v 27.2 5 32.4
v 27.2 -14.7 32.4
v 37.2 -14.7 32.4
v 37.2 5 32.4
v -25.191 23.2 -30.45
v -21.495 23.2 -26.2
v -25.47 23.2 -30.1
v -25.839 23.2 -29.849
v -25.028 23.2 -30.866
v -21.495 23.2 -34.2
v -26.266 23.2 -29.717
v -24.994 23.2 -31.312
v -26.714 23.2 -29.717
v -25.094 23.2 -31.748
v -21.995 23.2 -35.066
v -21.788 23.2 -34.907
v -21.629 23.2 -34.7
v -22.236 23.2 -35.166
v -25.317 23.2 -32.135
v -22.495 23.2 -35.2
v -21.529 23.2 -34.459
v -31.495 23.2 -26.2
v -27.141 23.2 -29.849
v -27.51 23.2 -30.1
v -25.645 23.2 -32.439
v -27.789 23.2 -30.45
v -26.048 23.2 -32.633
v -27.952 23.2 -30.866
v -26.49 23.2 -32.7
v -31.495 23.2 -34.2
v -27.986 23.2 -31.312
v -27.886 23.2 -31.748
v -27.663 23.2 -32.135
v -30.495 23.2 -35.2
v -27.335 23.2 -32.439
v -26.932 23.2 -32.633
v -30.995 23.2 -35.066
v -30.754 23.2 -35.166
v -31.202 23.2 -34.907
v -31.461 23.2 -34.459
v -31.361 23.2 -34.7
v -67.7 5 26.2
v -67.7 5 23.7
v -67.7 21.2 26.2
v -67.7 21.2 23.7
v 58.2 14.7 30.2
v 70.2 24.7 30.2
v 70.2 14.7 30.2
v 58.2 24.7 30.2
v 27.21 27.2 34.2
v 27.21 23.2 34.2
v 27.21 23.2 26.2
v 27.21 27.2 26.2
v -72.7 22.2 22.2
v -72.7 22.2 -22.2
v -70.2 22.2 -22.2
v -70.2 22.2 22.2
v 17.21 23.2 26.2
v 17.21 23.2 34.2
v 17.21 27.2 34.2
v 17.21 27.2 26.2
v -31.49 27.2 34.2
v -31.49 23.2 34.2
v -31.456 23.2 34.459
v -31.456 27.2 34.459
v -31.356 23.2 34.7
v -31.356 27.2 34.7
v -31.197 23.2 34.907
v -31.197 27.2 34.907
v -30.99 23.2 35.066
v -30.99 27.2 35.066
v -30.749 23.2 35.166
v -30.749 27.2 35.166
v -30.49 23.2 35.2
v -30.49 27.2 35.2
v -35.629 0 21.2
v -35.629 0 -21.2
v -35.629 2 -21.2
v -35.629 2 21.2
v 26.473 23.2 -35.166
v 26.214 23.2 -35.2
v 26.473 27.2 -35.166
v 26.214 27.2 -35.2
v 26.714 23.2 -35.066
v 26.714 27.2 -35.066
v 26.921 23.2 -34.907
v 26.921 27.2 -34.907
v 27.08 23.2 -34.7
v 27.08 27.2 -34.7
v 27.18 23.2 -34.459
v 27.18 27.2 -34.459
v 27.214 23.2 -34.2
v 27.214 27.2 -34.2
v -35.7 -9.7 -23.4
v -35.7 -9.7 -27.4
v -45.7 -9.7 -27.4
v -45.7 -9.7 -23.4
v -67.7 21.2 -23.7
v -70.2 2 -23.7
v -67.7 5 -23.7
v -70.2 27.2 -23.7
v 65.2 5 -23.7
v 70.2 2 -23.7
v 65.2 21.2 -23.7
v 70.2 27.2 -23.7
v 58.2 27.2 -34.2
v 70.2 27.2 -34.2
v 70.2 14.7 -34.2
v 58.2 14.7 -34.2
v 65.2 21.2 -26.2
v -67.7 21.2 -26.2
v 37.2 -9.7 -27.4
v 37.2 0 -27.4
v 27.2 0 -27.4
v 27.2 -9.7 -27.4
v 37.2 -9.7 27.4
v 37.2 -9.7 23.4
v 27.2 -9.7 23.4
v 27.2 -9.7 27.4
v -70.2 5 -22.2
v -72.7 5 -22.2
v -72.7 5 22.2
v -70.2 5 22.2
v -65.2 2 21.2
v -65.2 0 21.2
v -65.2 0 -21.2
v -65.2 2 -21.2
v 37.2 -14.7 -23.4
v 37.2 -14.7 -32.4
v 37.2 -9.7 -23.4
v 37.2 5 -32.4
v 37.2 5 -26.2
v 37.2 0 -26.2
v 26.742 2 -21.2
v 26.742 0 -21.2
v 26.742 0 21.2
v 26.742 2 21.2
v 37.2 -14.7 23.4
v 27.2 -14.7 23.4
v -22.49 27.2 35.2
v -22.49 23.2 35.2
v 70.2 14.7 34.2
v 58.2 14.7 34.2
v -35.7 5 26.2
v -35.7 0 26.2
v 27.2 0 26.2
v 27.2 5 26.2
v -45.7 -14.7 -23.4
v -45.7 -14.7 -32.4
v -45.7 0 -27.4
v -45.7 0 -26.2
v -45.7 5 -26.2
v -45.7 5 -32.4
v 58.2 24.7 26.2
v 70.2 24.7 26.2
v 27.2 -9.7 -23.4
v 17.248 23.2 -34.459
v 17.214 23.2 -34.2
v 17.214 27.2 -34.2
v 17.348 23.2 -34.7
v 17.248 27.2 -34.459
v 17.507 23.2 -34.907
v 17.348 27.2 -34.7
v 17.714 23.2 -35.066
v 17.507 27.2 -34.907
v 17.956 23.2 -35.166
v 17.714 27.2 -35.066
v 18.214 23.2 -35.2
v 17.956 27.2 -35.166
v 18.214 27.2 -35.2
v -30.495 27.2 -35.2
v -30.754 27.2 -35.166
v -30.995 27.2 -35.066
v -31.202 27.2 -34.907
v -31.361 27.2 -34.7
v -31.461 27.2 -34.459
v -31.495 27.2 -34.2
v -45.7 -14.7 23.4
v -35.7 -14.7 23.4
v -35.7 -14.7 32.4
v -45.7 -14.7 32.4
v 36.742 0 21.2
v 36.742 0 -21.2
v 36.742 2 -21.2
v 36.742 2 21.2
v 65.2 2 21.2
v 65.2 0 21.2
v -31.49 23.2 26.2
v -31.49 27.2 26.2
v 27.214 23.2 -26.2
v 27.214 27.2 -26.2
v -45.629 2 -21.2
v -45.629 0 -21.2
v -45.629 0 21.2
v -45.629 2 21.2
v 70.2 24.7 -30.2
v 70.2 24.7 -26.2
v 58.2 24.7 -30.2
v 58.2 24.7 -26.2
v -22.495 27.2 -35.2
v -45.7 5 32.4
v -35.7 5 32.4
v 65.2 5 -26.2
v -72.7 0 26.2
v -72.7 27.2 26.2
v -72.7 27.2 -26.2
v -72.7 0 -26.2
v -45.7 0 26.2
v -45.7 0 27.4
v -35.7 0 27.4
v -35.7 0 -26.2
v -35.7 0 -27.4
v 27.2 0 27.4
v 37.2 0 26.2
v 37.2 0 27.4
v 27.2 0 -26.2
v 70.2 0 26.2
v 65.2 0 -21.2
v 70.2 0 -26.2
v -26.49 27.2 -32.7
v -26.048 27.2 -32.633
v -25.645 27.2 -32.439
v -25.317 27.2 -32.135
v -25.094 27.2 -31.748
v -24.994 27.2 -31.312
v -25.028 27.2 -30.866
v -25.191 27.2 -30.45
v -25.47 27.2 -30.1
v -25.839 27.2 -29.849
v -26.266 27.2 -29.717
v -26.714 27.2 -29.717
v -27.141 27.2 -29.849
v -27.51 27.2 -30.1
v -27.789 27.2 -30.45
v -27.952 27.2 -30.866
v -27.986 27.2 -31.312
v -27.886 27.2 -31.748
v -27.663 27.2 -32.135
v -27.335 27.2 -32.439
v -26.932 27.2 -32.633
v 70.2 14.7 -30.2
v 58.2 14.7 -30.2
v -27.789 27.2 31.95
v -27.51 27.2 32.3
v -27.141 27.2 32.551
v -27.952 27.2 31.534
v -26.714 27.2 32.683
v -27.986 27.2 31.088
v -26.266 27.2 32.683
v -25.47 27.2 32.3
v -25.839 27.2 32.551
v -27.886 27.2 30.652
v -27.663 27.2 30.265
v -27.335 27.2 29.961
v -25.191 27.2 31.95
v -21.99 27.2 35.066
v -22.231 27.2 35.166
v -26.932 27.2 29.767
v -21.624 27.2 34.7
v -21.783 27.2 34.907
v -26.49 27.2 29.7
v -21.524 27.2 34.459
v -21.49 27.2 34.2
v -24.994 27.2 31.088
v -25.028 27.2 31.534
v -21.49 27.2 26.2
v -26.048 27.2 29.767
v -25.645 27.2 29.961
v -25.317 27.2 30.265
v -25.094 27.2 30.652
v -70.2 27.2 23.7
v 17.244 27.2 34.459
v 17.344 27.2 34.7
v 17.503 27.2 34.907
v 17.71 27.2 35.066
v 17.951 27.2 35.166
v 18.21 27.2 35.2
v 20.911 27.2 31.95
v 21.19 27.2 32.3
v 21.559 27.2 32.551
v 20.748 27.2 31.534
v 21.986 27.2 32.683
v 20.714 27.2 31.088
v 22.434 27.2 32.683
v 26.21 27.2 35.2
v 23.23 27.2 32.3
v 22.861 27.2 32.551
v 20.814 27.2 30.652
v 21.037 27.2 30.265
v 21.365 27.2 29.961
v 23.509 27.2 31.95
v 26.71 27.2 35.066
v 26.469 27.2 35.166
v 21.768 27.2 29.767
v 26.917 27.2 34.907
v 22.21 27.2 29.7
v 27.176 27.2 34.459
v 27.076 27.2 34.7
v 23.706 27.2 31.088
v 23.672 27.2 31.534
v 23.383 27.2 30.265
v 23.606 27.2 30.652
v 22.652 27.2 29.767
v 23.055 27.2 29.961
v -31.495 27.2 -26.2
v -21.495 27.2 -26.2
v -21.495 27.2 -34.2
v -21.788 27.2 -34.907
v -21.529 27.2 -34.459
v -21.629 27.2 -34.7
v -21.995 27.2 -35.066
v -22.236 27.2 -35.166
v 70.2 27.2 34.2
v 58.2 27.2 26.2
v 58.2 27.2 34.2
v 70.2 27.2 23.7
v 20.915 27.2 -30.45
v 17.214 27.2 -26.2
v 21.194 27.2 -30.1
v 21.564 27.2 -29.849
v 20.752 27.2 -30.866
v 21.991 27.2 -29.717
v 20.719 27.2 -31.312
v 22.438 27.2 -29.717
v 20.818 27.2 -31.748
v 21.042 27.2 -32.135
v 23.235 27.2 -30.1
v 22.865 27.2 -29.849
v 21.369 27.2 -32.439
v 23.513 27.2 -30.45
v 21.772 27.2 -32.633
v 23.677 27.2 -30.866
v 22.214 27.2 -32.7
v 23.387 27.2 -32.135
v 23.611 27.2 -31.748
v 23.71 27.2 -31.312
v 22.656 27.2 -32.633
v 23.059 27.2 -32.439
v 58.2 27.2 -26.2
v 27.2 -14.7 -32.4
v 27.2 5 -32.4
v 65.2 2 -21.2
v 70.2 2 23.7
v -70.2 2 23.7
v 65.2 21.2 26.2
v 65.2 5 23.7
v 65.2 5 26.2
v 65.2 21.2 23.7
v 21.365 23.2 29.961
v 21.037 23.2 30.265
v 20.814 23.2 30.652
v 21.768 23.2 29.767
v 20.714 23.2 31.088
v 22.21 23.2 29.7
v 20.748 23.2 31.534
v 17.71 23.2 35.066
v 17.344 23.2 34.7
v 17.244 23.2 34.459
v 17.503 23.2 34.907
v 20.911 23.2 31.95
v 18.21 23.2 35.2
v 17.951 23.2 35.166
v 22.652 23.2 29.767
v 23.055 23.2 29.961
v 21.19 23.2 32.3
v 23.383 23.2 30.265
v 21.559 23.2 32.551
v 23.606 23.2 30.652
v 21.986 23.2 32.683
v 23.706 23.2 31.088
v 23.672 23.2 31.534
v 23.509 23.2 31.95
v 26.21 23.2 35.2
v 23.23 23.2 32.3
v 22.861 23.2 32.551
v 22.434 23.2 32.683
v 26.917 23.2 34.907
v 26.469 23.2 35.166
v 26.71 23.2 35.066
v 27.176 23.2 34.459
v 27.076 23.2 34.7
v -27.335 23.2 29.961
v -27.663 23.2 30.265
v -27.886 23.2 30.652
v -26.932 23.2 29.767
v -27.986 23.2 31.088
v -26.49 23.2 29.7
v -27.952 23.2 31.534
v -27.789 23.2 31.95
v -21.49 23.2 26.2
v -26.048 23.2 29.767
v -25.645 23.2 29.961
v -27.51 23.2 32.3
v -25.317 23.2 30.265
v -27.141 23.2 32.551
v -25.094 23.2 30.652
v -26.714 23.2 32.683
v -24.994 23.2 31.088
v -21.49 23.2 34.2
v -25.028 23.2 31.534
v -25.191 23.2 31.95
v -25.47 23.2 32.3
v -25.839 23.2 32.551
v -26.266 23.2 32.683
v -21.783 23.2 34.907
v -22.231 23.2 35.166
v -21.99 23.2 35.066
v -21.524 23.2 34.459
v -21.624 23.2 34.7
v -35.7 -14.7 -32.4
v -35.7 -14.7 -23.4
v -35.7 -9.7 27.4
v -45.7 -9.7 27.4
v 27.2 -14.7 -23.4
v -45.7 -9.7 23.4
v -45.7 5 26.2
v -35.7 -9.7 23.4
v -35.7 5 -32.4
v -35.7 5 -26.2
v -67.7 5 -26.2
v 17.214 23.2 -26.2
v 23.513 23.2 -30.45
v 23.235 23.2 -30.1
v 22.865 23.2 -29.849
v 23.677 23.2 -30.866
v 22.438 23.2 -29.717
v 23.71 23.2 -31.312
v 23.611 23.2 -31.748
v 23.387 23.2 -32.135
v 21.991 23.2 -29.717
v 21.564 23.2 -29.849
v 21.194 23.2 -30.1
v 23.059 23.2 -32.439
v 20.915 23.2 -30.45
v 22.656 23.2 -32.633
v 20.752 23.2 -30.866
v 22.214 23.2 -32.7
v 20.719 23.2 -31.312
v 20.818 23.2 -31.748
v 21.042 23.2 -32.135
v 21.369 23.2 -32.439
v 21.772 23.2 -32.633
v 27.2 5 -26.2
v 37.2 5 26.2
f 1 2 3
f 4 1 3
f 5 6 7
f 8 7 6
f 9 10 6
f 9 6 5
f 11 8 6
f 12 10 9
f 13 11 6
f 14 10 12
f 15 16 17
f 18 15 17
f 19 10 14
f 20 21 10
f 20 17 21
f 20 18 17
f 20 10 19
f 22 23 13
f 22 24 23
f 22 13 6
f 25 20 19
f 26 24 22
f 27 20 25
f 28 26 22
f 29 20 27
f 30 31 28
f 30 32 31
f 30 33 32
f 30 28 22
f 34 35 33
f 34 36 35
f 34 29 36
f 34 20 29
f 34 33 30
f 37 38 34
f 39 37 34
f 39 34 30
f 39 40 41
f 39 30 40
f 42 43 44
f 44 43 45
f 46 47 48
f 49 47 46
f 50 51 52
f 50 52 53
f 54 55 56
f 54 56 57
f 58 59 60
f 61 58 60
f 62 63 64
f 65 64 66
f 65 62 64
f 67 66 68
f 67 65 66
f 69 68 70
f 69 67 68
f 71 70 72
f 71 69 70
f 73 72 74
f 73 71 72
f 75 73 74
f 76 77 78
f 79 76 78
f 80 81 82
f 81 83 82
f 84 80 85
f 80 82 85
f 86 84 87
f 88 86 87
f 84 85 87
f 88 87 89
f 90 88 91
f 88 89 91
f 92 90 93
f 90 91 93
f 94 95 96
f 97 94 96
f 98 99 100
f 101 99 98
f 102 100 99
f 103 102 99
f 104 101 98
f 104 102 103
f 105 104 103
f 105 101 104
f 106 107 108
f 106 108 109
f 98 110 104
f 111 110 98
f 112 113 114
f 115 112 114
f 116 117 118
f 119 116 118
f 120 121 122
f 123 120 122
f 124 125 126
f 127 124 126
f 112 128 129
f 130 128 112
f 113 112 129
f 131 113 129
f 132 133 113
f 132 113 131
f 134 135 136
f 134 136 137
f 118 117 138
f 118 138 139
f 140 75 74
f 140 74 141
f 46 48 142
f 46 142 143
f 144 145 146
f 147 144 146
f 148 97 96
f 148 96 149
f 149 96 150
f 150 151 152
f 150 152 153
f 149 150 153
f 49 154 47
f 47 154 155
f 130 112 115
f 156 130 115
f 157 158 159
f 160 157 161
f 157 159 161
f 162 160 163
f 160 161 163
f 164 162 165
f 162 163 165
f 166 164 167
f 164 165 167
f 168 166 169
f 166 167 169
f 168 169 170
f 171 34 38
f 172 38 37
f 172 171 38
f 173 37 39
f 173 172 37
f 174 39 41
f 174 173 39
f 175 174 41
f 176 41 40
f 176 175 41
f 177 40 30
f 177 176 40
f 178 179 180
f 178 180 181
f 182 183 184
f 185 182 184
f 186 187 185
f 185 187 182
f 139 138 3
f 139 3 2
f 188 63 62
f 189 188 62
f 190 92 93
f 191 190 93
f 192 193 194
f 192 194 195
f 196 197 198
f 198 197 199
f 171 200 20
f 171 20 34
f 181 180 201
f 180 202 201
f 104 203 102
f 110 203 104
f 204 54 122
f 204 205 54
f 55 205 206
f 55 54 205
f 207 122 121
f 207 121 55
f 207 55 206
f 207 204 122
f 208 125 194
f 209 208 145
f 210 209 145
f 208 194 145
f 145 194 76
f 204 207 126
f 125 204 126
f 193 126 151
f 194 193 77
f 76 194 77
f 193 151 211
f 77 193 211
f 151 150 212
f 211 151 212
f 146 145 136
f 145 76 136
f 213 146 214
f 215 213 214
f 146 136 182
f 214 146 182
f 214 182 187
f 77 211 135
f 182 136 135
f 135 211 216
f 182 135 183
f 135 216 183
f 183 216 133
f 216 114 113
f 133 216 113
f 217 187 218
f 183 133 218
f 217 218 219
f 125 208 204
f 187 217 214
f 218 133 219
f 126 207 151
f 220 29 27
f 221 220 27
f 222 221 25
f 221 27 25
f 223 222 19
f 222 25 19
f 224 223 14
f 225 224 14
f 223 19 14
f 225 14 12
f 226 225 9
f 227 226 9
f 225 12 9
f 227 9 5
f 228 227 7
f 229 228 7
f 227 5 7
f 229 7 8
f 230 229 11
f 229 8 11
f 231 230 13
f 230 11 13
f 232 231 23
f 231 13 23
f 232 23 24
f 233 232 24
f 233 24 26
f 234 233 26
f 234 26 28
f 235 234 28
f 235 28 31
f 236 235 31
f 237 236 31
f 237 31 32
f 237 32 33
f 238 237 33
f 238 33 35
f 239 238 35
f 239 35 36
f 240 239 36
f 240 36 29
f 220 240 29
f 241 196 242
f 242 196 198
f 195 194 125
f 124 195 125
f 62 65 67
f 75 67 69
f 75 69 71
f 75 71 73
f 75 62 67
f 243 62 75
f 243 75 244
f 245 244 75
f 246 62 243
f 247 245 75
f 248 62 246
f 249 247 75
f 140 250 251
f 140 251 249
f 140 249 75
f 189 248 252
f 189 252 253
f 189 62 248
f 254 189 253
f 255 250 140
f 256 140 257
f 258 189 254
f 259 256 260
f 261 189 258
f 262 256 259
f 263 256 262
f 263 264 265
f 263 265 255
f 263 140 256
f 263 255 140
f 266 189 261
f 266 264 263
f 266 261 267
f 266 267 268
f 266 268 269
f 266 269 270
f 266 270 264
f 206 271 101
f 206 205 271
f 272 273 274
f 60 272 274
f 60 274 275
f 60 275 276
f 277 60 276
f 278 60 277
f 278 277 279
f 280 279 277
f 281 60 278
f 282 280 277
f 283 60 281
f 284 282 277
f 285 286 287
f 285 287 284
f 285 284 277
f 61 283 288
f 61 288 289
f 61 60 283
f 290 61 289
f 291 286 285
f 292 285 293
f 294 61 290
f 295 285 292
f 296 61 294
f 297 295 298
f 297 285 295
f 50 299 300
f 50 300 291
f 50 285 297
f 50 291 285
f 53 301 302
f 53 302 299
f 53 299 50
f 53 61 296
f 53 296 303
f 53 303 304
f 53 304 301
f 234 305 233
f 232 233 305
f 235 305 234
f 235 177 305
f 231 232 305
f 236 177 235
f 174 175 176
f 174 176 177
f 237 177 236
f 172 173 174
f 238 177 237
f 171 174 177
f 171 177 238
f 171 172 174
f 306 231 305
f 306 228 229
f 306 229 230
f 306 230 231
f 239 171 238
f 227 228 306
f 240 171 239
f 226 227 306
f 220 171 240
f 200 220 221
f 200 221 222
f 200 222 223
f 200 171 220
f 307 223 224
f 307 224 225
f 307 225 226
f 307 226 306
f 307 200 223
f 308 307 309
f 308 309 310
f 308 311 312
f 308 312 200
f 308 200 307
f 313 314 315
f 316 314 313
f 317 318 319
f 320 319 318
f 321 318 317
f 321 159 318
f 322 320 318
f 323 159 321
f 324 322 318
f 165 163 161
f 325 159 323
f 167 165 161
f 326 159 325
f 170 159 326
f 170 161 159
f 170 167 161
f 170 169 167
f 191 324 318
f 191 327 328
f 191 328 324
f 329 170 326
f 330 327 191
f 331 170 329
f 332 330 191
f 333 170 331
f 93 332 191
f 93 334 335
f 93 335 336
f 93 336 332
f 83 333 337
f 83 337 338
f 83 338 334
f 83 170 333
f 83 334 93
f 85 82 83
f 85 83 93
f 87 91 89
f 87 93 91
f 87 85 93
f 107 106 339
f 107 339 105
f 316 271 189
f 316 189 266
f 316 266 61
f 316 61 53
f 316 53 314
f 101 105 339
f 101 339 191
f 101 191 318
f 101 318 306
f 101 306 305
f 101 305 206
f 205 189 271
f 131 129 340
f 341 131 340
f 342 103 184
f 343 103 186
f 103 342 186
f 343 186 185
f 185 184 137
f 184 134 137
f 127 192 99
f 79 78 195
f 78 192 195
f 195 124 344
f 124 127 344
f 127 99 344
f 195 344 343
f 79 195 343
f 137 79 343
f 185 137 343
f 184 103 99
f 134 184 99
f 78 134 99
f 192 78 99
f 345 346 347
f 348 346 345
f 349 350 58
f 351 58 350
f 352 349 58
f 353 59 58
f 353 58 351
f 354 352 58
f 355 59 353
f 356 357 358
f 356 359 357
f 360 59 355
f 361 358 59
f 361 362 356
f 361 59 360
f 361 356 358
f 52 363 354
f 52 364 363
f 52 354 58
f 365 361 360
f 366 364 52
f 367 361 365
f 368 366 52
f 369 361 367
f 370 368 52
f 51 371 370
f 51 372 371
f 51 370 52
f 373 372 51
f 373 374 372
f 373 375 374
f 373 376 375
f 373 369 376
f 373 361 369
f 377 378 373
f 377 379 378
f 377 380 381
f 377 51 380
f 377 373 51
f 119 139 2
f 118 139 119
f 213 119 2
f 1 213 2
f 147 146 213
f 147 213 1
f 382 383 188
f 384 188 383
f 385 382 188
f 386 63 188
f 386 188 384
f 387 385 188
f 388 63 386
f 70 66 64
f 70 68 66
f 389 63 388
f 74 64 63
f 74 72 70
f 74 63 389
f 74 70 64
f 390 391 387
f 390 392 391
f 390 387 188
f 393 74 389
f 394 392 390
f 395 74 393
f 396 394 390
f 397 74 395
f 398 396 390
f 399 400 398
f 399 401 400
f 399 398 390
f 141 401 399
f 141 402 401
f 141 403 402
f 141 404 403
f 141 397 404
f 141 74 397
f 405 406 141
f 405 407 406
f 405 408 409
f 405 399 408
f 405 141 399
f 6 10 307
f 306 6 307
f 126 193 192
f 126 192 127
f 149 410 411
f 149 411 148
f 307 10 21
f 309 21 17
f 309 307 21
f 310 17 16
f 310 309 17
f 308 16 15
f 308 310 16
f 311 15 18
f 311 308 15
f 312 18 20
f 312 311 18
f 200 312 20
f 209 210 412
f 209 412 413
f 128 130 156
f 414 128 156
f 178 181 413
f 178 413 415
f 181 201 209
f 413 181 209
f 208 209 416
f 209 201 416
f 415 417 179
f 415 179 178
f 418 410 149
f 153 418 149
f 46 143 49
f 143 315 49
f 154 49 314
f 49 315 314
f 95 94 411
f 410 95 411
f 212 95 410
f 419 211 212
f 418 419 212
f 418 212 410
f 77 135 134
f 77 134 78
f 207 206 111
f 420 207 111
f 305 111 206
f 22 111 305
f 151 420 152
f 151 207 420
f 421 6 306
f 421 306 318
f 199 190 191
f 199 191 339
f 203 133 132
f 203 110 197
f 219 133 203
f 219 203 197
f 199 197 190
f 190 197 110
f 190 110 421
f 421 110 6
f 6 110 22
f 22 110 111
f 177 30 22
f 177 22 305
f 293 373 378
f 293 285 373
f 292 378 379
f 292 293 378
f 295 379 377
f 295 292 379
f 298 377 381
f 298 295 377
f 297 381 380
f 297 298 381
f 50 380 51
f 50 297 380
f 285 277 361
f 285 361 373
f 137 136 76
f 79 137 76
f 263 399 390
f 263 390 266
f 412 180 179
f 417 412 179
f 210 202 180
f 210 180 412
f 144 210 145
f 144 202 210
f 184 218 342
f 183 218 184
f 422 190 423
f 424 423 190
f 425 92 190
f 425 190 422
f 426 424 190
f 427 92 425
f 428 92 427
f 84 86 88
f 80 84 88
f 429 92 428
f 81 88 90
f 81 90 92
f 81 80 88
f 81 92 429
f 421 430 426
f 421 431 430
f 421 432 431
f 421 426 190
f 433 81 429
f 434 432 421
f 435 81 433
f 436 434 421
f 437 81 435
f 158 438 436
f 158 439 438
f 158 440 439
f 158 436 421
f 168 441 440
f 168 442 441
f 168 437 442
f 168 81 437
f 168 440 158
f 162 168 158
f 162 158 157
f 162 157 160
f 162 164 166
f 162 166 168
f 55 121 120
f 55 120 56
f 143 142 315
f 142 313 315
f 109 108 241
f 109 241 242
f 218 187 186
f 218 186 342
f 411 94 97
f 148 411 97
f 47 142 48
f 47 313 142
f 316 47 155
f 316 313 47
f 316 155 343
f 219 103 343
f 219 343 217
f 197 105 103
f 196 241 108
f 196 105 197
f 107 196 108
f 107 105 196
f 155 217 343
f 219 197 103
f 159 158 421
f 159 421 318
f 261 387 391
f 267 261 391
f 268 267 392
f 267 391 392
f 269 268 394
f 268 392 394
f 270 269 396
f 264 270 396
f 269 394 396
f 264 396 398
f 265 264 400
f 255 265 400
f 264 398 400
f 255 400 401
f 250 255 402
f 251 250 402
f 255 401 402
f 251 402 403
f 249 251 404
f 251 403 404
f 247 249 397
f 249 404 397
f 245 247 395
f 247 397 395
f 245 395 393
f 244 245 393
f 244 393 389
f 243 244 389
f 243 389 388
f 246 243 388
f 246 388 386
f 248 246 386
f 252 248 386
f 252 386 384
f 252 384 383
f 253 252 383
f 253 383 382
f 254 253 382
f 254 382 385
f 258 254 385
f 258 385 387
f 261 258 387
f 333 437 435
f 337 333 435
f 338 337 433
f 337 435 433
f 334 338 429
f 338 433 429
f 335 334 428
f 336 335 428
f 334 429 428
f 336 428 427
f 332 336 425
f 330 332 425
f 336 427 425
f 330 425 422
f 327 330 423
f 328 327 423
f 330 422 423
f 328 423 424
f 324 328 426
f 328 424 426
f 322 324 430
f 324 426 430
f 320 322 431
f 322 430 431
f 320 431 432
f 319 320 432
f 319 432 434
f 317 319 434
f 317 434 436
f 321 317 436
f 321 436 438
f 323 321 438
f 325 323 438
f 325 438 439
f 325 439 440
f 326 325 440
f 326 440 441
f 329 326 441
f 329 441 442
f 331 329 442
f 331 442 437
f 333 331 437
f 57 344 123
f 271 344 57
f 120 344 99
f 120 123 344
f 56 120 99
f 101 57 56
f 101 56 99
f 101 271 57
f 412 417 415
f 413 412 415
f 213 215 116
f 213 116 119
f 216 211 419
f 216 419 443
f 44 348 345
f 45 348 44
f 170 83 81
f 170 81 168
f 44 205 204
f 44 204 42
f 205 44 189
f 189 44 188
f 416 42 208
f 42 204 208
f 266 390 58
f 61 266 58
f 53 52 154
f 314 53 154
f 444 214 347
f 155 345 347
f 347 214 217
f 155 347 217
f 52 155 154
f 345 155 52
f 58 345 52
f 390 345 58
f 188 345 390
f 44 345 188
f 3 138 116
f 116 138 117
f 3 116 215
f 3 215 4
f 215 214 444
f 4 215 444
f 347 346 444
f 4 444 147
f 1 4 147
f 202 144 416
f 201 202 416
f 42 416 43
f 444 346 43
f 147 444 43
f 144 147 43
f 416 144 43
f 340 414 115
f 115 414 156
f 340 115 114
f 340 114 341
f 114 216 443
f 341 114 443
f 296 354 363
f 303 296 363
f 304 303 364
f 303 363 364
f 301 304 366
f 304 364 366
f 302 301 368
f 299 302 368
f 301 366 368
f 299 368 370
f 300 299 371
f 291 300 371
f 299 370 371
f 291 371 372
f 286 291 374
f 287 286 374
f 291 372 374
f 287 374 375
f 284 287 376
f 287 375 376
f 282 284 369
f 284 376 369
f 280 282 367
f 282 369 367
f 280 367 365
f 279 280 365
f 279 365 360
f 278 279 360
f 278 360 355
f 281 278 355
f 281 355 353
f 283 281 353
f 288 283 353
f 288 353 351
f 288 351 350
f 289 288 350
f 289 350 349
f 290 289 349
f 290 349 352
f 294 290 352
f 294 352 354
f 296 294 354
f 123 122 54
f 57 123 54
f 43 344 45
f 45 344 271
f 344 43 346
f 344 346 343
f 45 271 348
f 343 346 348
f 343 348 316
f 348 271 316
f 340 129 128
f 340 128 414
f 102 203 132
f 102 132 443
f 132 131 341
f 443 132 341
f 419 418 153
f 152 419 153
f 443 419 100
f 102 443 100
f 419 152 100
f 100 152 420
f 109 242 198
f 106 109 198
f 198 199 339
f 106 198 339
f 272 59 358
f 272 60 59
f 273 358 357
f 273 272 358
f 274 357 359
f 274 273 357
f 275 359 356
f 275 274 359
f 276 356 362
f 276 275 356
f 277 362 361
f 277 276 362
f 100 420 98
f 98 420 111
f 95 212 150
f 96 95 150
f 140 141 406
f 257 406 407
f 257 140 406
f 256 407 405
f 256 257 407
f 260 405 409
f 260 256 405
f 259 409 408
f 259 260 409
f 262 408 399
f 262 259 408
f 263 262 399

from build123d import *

# Parameters (mm, degrees)
SKETCH1_W            = 145.4
SKETCH1_H            = 52.4
BOSS_EXTRUDE1_DEPTH  = 27.2
SKETCH2_W            = 140.4
SKETCH2_H            = 47.4
CUT_EXTRUDE1_DEPTH   = 25.2
SKETCH3_W            = 46.4
SKETCH3_H            = 25.2
CUT_EXTRUDE2_DEPTH   = 25.2
SKETCH8_W            = 2.5
SKETCH8_H            = 52.4
CUT_EXTRUDE5_DEPTH   = 43
SKETCH9_W            = 44.4
SKETCH9_H            = 17.2
CUT_EXTRUDE6_DEPTH   = 43
SKETCH11_W           = 132.9
SKETCH11_H           = 16.2
CUT_EXTRUDE7_DEPTH   = 59
SKETCH12_W           = 130.4
SKETCH12_H           = 42.4
CUT_EXTRUDE8_DEPTH   = 10
SKETCH16_W           = 12
SKETCH16_H           = 2.5
BOSS_EXTRUDE4_DEPTH  = 8
SKETCH18_W           = 12
SKETCH18_H           = 2.5
BOSS_EXTRUDE6_DEPTH  = 8
SKETCH24_W           = 10
SKETCH24_H           = 5
BOSS_EXTRUDE12_DEPTH = 6.2
SKETCH25_W           = 10
SKETCH25_H           = 5
BOSS_EXTRUDE13_DEPTH = 6.2
SKETCH26_W           = 10
SKETCH26_H           = 5
BOSS_EXTRUDE14_DEPTH = 9.7
SKETCH27_W           = 10
SKETCH27_H           = 9
BOSS_EXTRUDE15_DEPTH = 5
SKETCH28_W           = 10
SKETCH28_H           = 2
BOSS_EXTRUDE16_DEPTH = 42.4
SKETCH29_W           = 10
SKETCH29_H           = 2
BOSS_EXTRUDE17_DEPTH = 42.4
SKETCH30_W           = 12
SKETCH30_H           = 4
BOSS_EXTRUDE18_DEPTH = 10
SKETCH35_W           = 10
SKETCH35_H           = 6
BOSS_EXTRUDE22_DEPTH = 9
SKETCH36_W           = 10
SKETCH36_H           = 6
BOSS_EXTRUDE23_DEPTH = 9
SKETCH37_R           = 1.5
CUT_EXTRUDE10_DEPTH  = 9
SKETCH38_W           = 10
SKETCH38_H           = 2
CUT_EXTRUDE11_DEPTH  = 9
SKETCH39_W           = 10
SKETCH39_H           = 2
CUT_EXTRUDE12_DEPTH  = 9
SKETCH40_W           = 10
SKETCH40_H           = 2
CUT_EXTRUDE13_DEPTH  = 9
FILLET1_R            = 1


with BuildPart() as part:
    # Sketch1 → Boss-Extrude1 (new body)
    with BuildSketch(Plane(origin=(0, 0, 0), x_dir=(1, 0, 0), z_dir=(0, 1, 0))):
        Rectangle(SKETCH1_W, SKETCH1_H)
    extrude(amount=BOSS_EXTRUDE1_DEPTH)

    # Sketch2 → Cut-Extrude1 (cut)
    with BuildSketch(Plane(origin=(0, 27.2, 0), x_dir=(1, 0, 0), z_dir=(0, 1, 0))):
        Rectangle(SKETCH2_W, SKETCH2_H)
    extrude(amount=-CUT_EXTRUDE1_DEPTH, mode=Mode.SUBTRACT)

    # Sketch3 → Cut-Extrude2 (cut)
    with BuildSketch(Plane.ZY.offset(-70.2)):
        with Locations((0.5, 14.6)):
            Rectangle(SKETCH3_W, SKETCH3_H)
    extrude(amount=-CUT_EXTRUDE2_DEPTH, mode=Mode.SUBTRACT)

    # Sketch8 → Cut-Extrude5 (cut)
    with BuildSketch(Plane(origin=(0, 27.2, 0), x_dir=(1, 0, 0), z_dir=(0, 1, 0))):
        with Locations((71.45, 0)):
            Rectangle(SKETCH8_W, SKETCH8_H)
    extrude(amount=-CUT_EXTRUDE5_DEPTH, mode=Mode.SUBTRACT)

    # Sketch9 → Cut-Extrude6 (cut)
    with BuildSketch(Plane.ZY.offset(72.7)):
        with Locations((0, 13.6)):
            Rectangle(SKETCH9_W, SKETCH9_H)
    extrude(amount=-CUT_EXTRUDE6_DEPTH, mode=Mode.SUBTRACT)

    # Sketch11 → Cut-Extrude7 (cut)
    with BuildSketch(Plane(origin=(0, 0, -26.2), x_dir=(-1, 0, 0), z_dir=(0, 0, -1))):
        with Locations((1.25, 13.1)):
            Rectangle(SKETCH11_W, SKETCH11_H)
    extrude(amount=-CUT_EXTRUDE7_DEPTH, mode=Mode.SUBTRACT)

    # Sketch12 → Cut-Extrude8 (cut)
    with BuildSketch(Plane(origin=(0, 0, 0), x_dir=(-1, 0, 0), z_dir=(0, -1, 0))):
        Rectangle(SKETCH12_W, SKETCH12_H)
    extrude(amount=-CUT_EXTRUDE8_DEPTH, mode=Mode.SUBTRACT)

    # Sketch16 → Boss-Extrude4 (add)
    with BuildSketch(Plane(origin=(0, 0, -26.2), x_dir=(-1, 0, 0), z_dir=(0, 0, -1))):
        with Locations((-64.2, 25.95)):
            Rectangle(SKETCH16_W, SKETCH16_H)
    extrude(amount=BOSS_EXTRUDE4_DEPTH)

    # Sketch18 → Boss-Extrude6 (add)
    with BuildSketch(Plane.XY.offset(26.2)):
        with Locations((64.2, 25.95)):
            Rectangle(SKETCH18_W, SKETCH18_H)
    extrude(amount=BOSS_EXTRUDE6_DEPTH)

    # Sketch24 → Boss-Extrude12 (add)
    with BuildSketch(Plane.XY.offset(26.2)):
        with Locations((-40.7, 2.5)):
            Rectangle(SKETCH24_W, SKETCH24_H)
        with Locations((32.2, 2.5)):
            Rectangle(SKETCH24_W, SKETCH24_H)
    extrude(amount=BOSS_EXTRUDE12_DEPTH)

    # Sketch25 → Boss-Extrude13 (add)
    with BuildSketch(Plane(origin=(0, 0, -26.2), x_dir=(-1, 0, 0), z_dir=(0, 0, -1))):
        with Locations((40.7, 2.5)):
            Rectangle(SKETCH25_W, SKETCH25_H)
        with Locations((-32.2, 2.5)):
            Rectangle(SKETCH25_W, SKETCH25_H)
    extrude(amount=BOSS_EXTRUDE13_DEPTH)

    # Sketch26 → Boss-Extrude14 (add)
    with BuildSketch(Plane(origin=(0, 0, 0), x_dir=(-1, 0, 0), z_dir=(0, -1, 0))):
        with Locations((40.7, 29.9)):
            Rectangle(SKETCH26_W, SKETCH26_H)
        with Locations((40.7, -29.9)):
            Rectangle(SKETCH26_W, SKETCH26_H)
        with Locations((-32.2, -29.9)):
            Rectangle(SKETCH26_W, SKETCH26_H)
        with Locations((-32.2, 29.9)):
            Rectangle(SKETCH26_W, SKETCH26_H)
    extrude(amount=BOSS_EXTRUDE14_DEPTH)

    # Sketch27 → Boss-Extrude15 (add)
    with BuildSketch(Plane(origin=(0, -9.7, 0), x_dir=(-1, 0, 0), z_dir=(0, -1, 0))):
        with Locations((40.7, -27.9)):
            Rectangle(SKETCH27_W, SKETCH27_H)
        with Locations((-32.2, -27.9)):
            Rectangle(SKETCH27_W, SKETCH27_H)
        with Locations((40.7, 27.9)):
            Rectangle(SKETCH27_W, SKETCH27_H)
        with Locations((-32.2, 27.9)):
            Rectangle(SKETCH27_W, SKETCH27_H)
    extrude(amount=BOSS_EXTRUDE15_DEPTH)

    # Sketch28 → Boss-Extrude16 (add)
    with BuildSketch(Plane.XY.offset(-21.2)):
        with Locations((-40.62922207, 1)):
            Rectangle(SKETCH28_W, SKETCH28_H)
    extrude(amount=BOSS_EXTRUDE16_DEPTH)

    # Sketch29 → Boss-Extrude17 (add)
    with BuildSketch(Plane.XY.offset(-21.2)):
        with Locations((31.742427041, 1)):
            Rectangle(SKETCH29_W, SKETCH29_H)
    extrude(amount=BOSS_EXTRUDE17_DEPTH)

    # Sketch30 → Boss-Extrude18 (add)
    with BuildSketch(Plane(origin=(0, 24.7, 0), x_dir=(-1, 0, 0), z_dir=(0, -1, 0))):
        with Locations((-64.2, -32.2)):
            Rectangle(SKETCH30_W, SKETCH30_H)
        with Locations((-64.2, 32.2)):
            Rectangle(SKETCH30_W, SKETCH30_H)
    extrude(amount=BOSS_EXTRUDE18_DEPTH)

    # Sketch35 → Boss-Extrude22 (add)
    with BuildSketch(Plane(origin=(0, 0, -26.2), x_dir=(-1, 0, 0), z_dir=(0, 0, -1))):
        with Locations((-22.214363523, 24.2)):
            Rectangle(SKETCH35_W, SKETCH35_H)
        with Locations((26.494707746, 24.2)):
            Rectangle(SKETCH35_W, SKETCH35_H)
    extrude(amount=BOSS_EXTRUDE22_DEPTH)

    # Sketch36 → Boss-Extrude23 (add)
    with BuildSketch(Plane.XY.offset(26.2)):
        with Locations((-26.49, 24.2)):
            Rectangle(SKETCH36_W, SKETCH36_H)
        with Locations((22.21, 24.2)):
            Rectangle(SKETCH36_W, SKETCH36_H)
    extrude(amount=BOSS_EXTRUDE23_DEPTH)

    # Sketch37 → Cut-Extrude10 (cut)
    with BuildSketch(Plane.XZ.offset(-21.2)):
        with Locations(Location((-26.49, 31.2, 0), (0, 0, 270))):
            Circle(SKETCH37_R)
        with Locations(Location((22.21, 31.2, 0), (0, 0, 270))):
            Circle(SKETCH37_R)
        with Locations(Location((-26.49, -31.2, 0), (0, 0, 270))):
            Circle(SKETCH37_R)
        with Locations(Location((22.214363523, -31.2, 0), (0, 0, 270))):
            Circle(SKETCH37_R)
    extrude(amount=-CUT_EXTRUDE10_DEPTH, mode=Mode.SUBTRACT)

    # Sketch38 → Cut-Extrude11 (cut)
    with BuildSketch(Plane.XY.offset(35.2)):
        with Locations((-26.49, 22.2)):
            Rectangle(SKETCH38_W, SKETCH38_H)
    extrude(amount=-CUT_EXTRUDE11_DEPTH, mode=Mode.SUBTRACT)

    # Sketch39 → Cut-Extrude12 (cut)
    with BuildSketch(Plane.XY.offset(35.2)):
        with Locations((22.21, 22.2)):
            Rectangle(SKETCH39_W, SKETCH39_H)
    extrude(amount=-CUT_EXTRUDE12_DEPTH, mode=Mode.SUBTRACT)

    # Sketch40 → Cut-Extrude13 (cut)
    with BuildSketch(Plane(origin=(0, 0, -35.2), x_dir=(-1, 0, 0), z_dir=(0, 0, -1))):
        with Locations((-22.214363523, 22.2)):
            Rectangle(SKETCH40_W, SKETCH40_H)
        with Locations((26.494707746, 22.2)):
            Rectangle(SKETCH40_W, SKETCH40_H)
    extrude(amount=-CUT_EXTRUDE13_DEPTH, mode=Mode.SUBTRACT)

    # Fillet1
    fillet1_edges = [part.edges().sort_by_distance(p)[0] for p in [
        (27.214363523, 25.2, -35.2),
        (-21.494707746, 25.2, -35.2),
        (-31.49, 25.2, 35.2),
        (17.21, 25.2, 35.2),
        (-21.49, 25.2, 35.2),
        (27.21, 25.2, 35.2),
        (-31.494707746, 25.2, -35.2),
        (17.214363523, 25.2, -35.2),
    ]]
    fillet(fillet1_edges, radius=FILLET1_R)


solid = part.part
